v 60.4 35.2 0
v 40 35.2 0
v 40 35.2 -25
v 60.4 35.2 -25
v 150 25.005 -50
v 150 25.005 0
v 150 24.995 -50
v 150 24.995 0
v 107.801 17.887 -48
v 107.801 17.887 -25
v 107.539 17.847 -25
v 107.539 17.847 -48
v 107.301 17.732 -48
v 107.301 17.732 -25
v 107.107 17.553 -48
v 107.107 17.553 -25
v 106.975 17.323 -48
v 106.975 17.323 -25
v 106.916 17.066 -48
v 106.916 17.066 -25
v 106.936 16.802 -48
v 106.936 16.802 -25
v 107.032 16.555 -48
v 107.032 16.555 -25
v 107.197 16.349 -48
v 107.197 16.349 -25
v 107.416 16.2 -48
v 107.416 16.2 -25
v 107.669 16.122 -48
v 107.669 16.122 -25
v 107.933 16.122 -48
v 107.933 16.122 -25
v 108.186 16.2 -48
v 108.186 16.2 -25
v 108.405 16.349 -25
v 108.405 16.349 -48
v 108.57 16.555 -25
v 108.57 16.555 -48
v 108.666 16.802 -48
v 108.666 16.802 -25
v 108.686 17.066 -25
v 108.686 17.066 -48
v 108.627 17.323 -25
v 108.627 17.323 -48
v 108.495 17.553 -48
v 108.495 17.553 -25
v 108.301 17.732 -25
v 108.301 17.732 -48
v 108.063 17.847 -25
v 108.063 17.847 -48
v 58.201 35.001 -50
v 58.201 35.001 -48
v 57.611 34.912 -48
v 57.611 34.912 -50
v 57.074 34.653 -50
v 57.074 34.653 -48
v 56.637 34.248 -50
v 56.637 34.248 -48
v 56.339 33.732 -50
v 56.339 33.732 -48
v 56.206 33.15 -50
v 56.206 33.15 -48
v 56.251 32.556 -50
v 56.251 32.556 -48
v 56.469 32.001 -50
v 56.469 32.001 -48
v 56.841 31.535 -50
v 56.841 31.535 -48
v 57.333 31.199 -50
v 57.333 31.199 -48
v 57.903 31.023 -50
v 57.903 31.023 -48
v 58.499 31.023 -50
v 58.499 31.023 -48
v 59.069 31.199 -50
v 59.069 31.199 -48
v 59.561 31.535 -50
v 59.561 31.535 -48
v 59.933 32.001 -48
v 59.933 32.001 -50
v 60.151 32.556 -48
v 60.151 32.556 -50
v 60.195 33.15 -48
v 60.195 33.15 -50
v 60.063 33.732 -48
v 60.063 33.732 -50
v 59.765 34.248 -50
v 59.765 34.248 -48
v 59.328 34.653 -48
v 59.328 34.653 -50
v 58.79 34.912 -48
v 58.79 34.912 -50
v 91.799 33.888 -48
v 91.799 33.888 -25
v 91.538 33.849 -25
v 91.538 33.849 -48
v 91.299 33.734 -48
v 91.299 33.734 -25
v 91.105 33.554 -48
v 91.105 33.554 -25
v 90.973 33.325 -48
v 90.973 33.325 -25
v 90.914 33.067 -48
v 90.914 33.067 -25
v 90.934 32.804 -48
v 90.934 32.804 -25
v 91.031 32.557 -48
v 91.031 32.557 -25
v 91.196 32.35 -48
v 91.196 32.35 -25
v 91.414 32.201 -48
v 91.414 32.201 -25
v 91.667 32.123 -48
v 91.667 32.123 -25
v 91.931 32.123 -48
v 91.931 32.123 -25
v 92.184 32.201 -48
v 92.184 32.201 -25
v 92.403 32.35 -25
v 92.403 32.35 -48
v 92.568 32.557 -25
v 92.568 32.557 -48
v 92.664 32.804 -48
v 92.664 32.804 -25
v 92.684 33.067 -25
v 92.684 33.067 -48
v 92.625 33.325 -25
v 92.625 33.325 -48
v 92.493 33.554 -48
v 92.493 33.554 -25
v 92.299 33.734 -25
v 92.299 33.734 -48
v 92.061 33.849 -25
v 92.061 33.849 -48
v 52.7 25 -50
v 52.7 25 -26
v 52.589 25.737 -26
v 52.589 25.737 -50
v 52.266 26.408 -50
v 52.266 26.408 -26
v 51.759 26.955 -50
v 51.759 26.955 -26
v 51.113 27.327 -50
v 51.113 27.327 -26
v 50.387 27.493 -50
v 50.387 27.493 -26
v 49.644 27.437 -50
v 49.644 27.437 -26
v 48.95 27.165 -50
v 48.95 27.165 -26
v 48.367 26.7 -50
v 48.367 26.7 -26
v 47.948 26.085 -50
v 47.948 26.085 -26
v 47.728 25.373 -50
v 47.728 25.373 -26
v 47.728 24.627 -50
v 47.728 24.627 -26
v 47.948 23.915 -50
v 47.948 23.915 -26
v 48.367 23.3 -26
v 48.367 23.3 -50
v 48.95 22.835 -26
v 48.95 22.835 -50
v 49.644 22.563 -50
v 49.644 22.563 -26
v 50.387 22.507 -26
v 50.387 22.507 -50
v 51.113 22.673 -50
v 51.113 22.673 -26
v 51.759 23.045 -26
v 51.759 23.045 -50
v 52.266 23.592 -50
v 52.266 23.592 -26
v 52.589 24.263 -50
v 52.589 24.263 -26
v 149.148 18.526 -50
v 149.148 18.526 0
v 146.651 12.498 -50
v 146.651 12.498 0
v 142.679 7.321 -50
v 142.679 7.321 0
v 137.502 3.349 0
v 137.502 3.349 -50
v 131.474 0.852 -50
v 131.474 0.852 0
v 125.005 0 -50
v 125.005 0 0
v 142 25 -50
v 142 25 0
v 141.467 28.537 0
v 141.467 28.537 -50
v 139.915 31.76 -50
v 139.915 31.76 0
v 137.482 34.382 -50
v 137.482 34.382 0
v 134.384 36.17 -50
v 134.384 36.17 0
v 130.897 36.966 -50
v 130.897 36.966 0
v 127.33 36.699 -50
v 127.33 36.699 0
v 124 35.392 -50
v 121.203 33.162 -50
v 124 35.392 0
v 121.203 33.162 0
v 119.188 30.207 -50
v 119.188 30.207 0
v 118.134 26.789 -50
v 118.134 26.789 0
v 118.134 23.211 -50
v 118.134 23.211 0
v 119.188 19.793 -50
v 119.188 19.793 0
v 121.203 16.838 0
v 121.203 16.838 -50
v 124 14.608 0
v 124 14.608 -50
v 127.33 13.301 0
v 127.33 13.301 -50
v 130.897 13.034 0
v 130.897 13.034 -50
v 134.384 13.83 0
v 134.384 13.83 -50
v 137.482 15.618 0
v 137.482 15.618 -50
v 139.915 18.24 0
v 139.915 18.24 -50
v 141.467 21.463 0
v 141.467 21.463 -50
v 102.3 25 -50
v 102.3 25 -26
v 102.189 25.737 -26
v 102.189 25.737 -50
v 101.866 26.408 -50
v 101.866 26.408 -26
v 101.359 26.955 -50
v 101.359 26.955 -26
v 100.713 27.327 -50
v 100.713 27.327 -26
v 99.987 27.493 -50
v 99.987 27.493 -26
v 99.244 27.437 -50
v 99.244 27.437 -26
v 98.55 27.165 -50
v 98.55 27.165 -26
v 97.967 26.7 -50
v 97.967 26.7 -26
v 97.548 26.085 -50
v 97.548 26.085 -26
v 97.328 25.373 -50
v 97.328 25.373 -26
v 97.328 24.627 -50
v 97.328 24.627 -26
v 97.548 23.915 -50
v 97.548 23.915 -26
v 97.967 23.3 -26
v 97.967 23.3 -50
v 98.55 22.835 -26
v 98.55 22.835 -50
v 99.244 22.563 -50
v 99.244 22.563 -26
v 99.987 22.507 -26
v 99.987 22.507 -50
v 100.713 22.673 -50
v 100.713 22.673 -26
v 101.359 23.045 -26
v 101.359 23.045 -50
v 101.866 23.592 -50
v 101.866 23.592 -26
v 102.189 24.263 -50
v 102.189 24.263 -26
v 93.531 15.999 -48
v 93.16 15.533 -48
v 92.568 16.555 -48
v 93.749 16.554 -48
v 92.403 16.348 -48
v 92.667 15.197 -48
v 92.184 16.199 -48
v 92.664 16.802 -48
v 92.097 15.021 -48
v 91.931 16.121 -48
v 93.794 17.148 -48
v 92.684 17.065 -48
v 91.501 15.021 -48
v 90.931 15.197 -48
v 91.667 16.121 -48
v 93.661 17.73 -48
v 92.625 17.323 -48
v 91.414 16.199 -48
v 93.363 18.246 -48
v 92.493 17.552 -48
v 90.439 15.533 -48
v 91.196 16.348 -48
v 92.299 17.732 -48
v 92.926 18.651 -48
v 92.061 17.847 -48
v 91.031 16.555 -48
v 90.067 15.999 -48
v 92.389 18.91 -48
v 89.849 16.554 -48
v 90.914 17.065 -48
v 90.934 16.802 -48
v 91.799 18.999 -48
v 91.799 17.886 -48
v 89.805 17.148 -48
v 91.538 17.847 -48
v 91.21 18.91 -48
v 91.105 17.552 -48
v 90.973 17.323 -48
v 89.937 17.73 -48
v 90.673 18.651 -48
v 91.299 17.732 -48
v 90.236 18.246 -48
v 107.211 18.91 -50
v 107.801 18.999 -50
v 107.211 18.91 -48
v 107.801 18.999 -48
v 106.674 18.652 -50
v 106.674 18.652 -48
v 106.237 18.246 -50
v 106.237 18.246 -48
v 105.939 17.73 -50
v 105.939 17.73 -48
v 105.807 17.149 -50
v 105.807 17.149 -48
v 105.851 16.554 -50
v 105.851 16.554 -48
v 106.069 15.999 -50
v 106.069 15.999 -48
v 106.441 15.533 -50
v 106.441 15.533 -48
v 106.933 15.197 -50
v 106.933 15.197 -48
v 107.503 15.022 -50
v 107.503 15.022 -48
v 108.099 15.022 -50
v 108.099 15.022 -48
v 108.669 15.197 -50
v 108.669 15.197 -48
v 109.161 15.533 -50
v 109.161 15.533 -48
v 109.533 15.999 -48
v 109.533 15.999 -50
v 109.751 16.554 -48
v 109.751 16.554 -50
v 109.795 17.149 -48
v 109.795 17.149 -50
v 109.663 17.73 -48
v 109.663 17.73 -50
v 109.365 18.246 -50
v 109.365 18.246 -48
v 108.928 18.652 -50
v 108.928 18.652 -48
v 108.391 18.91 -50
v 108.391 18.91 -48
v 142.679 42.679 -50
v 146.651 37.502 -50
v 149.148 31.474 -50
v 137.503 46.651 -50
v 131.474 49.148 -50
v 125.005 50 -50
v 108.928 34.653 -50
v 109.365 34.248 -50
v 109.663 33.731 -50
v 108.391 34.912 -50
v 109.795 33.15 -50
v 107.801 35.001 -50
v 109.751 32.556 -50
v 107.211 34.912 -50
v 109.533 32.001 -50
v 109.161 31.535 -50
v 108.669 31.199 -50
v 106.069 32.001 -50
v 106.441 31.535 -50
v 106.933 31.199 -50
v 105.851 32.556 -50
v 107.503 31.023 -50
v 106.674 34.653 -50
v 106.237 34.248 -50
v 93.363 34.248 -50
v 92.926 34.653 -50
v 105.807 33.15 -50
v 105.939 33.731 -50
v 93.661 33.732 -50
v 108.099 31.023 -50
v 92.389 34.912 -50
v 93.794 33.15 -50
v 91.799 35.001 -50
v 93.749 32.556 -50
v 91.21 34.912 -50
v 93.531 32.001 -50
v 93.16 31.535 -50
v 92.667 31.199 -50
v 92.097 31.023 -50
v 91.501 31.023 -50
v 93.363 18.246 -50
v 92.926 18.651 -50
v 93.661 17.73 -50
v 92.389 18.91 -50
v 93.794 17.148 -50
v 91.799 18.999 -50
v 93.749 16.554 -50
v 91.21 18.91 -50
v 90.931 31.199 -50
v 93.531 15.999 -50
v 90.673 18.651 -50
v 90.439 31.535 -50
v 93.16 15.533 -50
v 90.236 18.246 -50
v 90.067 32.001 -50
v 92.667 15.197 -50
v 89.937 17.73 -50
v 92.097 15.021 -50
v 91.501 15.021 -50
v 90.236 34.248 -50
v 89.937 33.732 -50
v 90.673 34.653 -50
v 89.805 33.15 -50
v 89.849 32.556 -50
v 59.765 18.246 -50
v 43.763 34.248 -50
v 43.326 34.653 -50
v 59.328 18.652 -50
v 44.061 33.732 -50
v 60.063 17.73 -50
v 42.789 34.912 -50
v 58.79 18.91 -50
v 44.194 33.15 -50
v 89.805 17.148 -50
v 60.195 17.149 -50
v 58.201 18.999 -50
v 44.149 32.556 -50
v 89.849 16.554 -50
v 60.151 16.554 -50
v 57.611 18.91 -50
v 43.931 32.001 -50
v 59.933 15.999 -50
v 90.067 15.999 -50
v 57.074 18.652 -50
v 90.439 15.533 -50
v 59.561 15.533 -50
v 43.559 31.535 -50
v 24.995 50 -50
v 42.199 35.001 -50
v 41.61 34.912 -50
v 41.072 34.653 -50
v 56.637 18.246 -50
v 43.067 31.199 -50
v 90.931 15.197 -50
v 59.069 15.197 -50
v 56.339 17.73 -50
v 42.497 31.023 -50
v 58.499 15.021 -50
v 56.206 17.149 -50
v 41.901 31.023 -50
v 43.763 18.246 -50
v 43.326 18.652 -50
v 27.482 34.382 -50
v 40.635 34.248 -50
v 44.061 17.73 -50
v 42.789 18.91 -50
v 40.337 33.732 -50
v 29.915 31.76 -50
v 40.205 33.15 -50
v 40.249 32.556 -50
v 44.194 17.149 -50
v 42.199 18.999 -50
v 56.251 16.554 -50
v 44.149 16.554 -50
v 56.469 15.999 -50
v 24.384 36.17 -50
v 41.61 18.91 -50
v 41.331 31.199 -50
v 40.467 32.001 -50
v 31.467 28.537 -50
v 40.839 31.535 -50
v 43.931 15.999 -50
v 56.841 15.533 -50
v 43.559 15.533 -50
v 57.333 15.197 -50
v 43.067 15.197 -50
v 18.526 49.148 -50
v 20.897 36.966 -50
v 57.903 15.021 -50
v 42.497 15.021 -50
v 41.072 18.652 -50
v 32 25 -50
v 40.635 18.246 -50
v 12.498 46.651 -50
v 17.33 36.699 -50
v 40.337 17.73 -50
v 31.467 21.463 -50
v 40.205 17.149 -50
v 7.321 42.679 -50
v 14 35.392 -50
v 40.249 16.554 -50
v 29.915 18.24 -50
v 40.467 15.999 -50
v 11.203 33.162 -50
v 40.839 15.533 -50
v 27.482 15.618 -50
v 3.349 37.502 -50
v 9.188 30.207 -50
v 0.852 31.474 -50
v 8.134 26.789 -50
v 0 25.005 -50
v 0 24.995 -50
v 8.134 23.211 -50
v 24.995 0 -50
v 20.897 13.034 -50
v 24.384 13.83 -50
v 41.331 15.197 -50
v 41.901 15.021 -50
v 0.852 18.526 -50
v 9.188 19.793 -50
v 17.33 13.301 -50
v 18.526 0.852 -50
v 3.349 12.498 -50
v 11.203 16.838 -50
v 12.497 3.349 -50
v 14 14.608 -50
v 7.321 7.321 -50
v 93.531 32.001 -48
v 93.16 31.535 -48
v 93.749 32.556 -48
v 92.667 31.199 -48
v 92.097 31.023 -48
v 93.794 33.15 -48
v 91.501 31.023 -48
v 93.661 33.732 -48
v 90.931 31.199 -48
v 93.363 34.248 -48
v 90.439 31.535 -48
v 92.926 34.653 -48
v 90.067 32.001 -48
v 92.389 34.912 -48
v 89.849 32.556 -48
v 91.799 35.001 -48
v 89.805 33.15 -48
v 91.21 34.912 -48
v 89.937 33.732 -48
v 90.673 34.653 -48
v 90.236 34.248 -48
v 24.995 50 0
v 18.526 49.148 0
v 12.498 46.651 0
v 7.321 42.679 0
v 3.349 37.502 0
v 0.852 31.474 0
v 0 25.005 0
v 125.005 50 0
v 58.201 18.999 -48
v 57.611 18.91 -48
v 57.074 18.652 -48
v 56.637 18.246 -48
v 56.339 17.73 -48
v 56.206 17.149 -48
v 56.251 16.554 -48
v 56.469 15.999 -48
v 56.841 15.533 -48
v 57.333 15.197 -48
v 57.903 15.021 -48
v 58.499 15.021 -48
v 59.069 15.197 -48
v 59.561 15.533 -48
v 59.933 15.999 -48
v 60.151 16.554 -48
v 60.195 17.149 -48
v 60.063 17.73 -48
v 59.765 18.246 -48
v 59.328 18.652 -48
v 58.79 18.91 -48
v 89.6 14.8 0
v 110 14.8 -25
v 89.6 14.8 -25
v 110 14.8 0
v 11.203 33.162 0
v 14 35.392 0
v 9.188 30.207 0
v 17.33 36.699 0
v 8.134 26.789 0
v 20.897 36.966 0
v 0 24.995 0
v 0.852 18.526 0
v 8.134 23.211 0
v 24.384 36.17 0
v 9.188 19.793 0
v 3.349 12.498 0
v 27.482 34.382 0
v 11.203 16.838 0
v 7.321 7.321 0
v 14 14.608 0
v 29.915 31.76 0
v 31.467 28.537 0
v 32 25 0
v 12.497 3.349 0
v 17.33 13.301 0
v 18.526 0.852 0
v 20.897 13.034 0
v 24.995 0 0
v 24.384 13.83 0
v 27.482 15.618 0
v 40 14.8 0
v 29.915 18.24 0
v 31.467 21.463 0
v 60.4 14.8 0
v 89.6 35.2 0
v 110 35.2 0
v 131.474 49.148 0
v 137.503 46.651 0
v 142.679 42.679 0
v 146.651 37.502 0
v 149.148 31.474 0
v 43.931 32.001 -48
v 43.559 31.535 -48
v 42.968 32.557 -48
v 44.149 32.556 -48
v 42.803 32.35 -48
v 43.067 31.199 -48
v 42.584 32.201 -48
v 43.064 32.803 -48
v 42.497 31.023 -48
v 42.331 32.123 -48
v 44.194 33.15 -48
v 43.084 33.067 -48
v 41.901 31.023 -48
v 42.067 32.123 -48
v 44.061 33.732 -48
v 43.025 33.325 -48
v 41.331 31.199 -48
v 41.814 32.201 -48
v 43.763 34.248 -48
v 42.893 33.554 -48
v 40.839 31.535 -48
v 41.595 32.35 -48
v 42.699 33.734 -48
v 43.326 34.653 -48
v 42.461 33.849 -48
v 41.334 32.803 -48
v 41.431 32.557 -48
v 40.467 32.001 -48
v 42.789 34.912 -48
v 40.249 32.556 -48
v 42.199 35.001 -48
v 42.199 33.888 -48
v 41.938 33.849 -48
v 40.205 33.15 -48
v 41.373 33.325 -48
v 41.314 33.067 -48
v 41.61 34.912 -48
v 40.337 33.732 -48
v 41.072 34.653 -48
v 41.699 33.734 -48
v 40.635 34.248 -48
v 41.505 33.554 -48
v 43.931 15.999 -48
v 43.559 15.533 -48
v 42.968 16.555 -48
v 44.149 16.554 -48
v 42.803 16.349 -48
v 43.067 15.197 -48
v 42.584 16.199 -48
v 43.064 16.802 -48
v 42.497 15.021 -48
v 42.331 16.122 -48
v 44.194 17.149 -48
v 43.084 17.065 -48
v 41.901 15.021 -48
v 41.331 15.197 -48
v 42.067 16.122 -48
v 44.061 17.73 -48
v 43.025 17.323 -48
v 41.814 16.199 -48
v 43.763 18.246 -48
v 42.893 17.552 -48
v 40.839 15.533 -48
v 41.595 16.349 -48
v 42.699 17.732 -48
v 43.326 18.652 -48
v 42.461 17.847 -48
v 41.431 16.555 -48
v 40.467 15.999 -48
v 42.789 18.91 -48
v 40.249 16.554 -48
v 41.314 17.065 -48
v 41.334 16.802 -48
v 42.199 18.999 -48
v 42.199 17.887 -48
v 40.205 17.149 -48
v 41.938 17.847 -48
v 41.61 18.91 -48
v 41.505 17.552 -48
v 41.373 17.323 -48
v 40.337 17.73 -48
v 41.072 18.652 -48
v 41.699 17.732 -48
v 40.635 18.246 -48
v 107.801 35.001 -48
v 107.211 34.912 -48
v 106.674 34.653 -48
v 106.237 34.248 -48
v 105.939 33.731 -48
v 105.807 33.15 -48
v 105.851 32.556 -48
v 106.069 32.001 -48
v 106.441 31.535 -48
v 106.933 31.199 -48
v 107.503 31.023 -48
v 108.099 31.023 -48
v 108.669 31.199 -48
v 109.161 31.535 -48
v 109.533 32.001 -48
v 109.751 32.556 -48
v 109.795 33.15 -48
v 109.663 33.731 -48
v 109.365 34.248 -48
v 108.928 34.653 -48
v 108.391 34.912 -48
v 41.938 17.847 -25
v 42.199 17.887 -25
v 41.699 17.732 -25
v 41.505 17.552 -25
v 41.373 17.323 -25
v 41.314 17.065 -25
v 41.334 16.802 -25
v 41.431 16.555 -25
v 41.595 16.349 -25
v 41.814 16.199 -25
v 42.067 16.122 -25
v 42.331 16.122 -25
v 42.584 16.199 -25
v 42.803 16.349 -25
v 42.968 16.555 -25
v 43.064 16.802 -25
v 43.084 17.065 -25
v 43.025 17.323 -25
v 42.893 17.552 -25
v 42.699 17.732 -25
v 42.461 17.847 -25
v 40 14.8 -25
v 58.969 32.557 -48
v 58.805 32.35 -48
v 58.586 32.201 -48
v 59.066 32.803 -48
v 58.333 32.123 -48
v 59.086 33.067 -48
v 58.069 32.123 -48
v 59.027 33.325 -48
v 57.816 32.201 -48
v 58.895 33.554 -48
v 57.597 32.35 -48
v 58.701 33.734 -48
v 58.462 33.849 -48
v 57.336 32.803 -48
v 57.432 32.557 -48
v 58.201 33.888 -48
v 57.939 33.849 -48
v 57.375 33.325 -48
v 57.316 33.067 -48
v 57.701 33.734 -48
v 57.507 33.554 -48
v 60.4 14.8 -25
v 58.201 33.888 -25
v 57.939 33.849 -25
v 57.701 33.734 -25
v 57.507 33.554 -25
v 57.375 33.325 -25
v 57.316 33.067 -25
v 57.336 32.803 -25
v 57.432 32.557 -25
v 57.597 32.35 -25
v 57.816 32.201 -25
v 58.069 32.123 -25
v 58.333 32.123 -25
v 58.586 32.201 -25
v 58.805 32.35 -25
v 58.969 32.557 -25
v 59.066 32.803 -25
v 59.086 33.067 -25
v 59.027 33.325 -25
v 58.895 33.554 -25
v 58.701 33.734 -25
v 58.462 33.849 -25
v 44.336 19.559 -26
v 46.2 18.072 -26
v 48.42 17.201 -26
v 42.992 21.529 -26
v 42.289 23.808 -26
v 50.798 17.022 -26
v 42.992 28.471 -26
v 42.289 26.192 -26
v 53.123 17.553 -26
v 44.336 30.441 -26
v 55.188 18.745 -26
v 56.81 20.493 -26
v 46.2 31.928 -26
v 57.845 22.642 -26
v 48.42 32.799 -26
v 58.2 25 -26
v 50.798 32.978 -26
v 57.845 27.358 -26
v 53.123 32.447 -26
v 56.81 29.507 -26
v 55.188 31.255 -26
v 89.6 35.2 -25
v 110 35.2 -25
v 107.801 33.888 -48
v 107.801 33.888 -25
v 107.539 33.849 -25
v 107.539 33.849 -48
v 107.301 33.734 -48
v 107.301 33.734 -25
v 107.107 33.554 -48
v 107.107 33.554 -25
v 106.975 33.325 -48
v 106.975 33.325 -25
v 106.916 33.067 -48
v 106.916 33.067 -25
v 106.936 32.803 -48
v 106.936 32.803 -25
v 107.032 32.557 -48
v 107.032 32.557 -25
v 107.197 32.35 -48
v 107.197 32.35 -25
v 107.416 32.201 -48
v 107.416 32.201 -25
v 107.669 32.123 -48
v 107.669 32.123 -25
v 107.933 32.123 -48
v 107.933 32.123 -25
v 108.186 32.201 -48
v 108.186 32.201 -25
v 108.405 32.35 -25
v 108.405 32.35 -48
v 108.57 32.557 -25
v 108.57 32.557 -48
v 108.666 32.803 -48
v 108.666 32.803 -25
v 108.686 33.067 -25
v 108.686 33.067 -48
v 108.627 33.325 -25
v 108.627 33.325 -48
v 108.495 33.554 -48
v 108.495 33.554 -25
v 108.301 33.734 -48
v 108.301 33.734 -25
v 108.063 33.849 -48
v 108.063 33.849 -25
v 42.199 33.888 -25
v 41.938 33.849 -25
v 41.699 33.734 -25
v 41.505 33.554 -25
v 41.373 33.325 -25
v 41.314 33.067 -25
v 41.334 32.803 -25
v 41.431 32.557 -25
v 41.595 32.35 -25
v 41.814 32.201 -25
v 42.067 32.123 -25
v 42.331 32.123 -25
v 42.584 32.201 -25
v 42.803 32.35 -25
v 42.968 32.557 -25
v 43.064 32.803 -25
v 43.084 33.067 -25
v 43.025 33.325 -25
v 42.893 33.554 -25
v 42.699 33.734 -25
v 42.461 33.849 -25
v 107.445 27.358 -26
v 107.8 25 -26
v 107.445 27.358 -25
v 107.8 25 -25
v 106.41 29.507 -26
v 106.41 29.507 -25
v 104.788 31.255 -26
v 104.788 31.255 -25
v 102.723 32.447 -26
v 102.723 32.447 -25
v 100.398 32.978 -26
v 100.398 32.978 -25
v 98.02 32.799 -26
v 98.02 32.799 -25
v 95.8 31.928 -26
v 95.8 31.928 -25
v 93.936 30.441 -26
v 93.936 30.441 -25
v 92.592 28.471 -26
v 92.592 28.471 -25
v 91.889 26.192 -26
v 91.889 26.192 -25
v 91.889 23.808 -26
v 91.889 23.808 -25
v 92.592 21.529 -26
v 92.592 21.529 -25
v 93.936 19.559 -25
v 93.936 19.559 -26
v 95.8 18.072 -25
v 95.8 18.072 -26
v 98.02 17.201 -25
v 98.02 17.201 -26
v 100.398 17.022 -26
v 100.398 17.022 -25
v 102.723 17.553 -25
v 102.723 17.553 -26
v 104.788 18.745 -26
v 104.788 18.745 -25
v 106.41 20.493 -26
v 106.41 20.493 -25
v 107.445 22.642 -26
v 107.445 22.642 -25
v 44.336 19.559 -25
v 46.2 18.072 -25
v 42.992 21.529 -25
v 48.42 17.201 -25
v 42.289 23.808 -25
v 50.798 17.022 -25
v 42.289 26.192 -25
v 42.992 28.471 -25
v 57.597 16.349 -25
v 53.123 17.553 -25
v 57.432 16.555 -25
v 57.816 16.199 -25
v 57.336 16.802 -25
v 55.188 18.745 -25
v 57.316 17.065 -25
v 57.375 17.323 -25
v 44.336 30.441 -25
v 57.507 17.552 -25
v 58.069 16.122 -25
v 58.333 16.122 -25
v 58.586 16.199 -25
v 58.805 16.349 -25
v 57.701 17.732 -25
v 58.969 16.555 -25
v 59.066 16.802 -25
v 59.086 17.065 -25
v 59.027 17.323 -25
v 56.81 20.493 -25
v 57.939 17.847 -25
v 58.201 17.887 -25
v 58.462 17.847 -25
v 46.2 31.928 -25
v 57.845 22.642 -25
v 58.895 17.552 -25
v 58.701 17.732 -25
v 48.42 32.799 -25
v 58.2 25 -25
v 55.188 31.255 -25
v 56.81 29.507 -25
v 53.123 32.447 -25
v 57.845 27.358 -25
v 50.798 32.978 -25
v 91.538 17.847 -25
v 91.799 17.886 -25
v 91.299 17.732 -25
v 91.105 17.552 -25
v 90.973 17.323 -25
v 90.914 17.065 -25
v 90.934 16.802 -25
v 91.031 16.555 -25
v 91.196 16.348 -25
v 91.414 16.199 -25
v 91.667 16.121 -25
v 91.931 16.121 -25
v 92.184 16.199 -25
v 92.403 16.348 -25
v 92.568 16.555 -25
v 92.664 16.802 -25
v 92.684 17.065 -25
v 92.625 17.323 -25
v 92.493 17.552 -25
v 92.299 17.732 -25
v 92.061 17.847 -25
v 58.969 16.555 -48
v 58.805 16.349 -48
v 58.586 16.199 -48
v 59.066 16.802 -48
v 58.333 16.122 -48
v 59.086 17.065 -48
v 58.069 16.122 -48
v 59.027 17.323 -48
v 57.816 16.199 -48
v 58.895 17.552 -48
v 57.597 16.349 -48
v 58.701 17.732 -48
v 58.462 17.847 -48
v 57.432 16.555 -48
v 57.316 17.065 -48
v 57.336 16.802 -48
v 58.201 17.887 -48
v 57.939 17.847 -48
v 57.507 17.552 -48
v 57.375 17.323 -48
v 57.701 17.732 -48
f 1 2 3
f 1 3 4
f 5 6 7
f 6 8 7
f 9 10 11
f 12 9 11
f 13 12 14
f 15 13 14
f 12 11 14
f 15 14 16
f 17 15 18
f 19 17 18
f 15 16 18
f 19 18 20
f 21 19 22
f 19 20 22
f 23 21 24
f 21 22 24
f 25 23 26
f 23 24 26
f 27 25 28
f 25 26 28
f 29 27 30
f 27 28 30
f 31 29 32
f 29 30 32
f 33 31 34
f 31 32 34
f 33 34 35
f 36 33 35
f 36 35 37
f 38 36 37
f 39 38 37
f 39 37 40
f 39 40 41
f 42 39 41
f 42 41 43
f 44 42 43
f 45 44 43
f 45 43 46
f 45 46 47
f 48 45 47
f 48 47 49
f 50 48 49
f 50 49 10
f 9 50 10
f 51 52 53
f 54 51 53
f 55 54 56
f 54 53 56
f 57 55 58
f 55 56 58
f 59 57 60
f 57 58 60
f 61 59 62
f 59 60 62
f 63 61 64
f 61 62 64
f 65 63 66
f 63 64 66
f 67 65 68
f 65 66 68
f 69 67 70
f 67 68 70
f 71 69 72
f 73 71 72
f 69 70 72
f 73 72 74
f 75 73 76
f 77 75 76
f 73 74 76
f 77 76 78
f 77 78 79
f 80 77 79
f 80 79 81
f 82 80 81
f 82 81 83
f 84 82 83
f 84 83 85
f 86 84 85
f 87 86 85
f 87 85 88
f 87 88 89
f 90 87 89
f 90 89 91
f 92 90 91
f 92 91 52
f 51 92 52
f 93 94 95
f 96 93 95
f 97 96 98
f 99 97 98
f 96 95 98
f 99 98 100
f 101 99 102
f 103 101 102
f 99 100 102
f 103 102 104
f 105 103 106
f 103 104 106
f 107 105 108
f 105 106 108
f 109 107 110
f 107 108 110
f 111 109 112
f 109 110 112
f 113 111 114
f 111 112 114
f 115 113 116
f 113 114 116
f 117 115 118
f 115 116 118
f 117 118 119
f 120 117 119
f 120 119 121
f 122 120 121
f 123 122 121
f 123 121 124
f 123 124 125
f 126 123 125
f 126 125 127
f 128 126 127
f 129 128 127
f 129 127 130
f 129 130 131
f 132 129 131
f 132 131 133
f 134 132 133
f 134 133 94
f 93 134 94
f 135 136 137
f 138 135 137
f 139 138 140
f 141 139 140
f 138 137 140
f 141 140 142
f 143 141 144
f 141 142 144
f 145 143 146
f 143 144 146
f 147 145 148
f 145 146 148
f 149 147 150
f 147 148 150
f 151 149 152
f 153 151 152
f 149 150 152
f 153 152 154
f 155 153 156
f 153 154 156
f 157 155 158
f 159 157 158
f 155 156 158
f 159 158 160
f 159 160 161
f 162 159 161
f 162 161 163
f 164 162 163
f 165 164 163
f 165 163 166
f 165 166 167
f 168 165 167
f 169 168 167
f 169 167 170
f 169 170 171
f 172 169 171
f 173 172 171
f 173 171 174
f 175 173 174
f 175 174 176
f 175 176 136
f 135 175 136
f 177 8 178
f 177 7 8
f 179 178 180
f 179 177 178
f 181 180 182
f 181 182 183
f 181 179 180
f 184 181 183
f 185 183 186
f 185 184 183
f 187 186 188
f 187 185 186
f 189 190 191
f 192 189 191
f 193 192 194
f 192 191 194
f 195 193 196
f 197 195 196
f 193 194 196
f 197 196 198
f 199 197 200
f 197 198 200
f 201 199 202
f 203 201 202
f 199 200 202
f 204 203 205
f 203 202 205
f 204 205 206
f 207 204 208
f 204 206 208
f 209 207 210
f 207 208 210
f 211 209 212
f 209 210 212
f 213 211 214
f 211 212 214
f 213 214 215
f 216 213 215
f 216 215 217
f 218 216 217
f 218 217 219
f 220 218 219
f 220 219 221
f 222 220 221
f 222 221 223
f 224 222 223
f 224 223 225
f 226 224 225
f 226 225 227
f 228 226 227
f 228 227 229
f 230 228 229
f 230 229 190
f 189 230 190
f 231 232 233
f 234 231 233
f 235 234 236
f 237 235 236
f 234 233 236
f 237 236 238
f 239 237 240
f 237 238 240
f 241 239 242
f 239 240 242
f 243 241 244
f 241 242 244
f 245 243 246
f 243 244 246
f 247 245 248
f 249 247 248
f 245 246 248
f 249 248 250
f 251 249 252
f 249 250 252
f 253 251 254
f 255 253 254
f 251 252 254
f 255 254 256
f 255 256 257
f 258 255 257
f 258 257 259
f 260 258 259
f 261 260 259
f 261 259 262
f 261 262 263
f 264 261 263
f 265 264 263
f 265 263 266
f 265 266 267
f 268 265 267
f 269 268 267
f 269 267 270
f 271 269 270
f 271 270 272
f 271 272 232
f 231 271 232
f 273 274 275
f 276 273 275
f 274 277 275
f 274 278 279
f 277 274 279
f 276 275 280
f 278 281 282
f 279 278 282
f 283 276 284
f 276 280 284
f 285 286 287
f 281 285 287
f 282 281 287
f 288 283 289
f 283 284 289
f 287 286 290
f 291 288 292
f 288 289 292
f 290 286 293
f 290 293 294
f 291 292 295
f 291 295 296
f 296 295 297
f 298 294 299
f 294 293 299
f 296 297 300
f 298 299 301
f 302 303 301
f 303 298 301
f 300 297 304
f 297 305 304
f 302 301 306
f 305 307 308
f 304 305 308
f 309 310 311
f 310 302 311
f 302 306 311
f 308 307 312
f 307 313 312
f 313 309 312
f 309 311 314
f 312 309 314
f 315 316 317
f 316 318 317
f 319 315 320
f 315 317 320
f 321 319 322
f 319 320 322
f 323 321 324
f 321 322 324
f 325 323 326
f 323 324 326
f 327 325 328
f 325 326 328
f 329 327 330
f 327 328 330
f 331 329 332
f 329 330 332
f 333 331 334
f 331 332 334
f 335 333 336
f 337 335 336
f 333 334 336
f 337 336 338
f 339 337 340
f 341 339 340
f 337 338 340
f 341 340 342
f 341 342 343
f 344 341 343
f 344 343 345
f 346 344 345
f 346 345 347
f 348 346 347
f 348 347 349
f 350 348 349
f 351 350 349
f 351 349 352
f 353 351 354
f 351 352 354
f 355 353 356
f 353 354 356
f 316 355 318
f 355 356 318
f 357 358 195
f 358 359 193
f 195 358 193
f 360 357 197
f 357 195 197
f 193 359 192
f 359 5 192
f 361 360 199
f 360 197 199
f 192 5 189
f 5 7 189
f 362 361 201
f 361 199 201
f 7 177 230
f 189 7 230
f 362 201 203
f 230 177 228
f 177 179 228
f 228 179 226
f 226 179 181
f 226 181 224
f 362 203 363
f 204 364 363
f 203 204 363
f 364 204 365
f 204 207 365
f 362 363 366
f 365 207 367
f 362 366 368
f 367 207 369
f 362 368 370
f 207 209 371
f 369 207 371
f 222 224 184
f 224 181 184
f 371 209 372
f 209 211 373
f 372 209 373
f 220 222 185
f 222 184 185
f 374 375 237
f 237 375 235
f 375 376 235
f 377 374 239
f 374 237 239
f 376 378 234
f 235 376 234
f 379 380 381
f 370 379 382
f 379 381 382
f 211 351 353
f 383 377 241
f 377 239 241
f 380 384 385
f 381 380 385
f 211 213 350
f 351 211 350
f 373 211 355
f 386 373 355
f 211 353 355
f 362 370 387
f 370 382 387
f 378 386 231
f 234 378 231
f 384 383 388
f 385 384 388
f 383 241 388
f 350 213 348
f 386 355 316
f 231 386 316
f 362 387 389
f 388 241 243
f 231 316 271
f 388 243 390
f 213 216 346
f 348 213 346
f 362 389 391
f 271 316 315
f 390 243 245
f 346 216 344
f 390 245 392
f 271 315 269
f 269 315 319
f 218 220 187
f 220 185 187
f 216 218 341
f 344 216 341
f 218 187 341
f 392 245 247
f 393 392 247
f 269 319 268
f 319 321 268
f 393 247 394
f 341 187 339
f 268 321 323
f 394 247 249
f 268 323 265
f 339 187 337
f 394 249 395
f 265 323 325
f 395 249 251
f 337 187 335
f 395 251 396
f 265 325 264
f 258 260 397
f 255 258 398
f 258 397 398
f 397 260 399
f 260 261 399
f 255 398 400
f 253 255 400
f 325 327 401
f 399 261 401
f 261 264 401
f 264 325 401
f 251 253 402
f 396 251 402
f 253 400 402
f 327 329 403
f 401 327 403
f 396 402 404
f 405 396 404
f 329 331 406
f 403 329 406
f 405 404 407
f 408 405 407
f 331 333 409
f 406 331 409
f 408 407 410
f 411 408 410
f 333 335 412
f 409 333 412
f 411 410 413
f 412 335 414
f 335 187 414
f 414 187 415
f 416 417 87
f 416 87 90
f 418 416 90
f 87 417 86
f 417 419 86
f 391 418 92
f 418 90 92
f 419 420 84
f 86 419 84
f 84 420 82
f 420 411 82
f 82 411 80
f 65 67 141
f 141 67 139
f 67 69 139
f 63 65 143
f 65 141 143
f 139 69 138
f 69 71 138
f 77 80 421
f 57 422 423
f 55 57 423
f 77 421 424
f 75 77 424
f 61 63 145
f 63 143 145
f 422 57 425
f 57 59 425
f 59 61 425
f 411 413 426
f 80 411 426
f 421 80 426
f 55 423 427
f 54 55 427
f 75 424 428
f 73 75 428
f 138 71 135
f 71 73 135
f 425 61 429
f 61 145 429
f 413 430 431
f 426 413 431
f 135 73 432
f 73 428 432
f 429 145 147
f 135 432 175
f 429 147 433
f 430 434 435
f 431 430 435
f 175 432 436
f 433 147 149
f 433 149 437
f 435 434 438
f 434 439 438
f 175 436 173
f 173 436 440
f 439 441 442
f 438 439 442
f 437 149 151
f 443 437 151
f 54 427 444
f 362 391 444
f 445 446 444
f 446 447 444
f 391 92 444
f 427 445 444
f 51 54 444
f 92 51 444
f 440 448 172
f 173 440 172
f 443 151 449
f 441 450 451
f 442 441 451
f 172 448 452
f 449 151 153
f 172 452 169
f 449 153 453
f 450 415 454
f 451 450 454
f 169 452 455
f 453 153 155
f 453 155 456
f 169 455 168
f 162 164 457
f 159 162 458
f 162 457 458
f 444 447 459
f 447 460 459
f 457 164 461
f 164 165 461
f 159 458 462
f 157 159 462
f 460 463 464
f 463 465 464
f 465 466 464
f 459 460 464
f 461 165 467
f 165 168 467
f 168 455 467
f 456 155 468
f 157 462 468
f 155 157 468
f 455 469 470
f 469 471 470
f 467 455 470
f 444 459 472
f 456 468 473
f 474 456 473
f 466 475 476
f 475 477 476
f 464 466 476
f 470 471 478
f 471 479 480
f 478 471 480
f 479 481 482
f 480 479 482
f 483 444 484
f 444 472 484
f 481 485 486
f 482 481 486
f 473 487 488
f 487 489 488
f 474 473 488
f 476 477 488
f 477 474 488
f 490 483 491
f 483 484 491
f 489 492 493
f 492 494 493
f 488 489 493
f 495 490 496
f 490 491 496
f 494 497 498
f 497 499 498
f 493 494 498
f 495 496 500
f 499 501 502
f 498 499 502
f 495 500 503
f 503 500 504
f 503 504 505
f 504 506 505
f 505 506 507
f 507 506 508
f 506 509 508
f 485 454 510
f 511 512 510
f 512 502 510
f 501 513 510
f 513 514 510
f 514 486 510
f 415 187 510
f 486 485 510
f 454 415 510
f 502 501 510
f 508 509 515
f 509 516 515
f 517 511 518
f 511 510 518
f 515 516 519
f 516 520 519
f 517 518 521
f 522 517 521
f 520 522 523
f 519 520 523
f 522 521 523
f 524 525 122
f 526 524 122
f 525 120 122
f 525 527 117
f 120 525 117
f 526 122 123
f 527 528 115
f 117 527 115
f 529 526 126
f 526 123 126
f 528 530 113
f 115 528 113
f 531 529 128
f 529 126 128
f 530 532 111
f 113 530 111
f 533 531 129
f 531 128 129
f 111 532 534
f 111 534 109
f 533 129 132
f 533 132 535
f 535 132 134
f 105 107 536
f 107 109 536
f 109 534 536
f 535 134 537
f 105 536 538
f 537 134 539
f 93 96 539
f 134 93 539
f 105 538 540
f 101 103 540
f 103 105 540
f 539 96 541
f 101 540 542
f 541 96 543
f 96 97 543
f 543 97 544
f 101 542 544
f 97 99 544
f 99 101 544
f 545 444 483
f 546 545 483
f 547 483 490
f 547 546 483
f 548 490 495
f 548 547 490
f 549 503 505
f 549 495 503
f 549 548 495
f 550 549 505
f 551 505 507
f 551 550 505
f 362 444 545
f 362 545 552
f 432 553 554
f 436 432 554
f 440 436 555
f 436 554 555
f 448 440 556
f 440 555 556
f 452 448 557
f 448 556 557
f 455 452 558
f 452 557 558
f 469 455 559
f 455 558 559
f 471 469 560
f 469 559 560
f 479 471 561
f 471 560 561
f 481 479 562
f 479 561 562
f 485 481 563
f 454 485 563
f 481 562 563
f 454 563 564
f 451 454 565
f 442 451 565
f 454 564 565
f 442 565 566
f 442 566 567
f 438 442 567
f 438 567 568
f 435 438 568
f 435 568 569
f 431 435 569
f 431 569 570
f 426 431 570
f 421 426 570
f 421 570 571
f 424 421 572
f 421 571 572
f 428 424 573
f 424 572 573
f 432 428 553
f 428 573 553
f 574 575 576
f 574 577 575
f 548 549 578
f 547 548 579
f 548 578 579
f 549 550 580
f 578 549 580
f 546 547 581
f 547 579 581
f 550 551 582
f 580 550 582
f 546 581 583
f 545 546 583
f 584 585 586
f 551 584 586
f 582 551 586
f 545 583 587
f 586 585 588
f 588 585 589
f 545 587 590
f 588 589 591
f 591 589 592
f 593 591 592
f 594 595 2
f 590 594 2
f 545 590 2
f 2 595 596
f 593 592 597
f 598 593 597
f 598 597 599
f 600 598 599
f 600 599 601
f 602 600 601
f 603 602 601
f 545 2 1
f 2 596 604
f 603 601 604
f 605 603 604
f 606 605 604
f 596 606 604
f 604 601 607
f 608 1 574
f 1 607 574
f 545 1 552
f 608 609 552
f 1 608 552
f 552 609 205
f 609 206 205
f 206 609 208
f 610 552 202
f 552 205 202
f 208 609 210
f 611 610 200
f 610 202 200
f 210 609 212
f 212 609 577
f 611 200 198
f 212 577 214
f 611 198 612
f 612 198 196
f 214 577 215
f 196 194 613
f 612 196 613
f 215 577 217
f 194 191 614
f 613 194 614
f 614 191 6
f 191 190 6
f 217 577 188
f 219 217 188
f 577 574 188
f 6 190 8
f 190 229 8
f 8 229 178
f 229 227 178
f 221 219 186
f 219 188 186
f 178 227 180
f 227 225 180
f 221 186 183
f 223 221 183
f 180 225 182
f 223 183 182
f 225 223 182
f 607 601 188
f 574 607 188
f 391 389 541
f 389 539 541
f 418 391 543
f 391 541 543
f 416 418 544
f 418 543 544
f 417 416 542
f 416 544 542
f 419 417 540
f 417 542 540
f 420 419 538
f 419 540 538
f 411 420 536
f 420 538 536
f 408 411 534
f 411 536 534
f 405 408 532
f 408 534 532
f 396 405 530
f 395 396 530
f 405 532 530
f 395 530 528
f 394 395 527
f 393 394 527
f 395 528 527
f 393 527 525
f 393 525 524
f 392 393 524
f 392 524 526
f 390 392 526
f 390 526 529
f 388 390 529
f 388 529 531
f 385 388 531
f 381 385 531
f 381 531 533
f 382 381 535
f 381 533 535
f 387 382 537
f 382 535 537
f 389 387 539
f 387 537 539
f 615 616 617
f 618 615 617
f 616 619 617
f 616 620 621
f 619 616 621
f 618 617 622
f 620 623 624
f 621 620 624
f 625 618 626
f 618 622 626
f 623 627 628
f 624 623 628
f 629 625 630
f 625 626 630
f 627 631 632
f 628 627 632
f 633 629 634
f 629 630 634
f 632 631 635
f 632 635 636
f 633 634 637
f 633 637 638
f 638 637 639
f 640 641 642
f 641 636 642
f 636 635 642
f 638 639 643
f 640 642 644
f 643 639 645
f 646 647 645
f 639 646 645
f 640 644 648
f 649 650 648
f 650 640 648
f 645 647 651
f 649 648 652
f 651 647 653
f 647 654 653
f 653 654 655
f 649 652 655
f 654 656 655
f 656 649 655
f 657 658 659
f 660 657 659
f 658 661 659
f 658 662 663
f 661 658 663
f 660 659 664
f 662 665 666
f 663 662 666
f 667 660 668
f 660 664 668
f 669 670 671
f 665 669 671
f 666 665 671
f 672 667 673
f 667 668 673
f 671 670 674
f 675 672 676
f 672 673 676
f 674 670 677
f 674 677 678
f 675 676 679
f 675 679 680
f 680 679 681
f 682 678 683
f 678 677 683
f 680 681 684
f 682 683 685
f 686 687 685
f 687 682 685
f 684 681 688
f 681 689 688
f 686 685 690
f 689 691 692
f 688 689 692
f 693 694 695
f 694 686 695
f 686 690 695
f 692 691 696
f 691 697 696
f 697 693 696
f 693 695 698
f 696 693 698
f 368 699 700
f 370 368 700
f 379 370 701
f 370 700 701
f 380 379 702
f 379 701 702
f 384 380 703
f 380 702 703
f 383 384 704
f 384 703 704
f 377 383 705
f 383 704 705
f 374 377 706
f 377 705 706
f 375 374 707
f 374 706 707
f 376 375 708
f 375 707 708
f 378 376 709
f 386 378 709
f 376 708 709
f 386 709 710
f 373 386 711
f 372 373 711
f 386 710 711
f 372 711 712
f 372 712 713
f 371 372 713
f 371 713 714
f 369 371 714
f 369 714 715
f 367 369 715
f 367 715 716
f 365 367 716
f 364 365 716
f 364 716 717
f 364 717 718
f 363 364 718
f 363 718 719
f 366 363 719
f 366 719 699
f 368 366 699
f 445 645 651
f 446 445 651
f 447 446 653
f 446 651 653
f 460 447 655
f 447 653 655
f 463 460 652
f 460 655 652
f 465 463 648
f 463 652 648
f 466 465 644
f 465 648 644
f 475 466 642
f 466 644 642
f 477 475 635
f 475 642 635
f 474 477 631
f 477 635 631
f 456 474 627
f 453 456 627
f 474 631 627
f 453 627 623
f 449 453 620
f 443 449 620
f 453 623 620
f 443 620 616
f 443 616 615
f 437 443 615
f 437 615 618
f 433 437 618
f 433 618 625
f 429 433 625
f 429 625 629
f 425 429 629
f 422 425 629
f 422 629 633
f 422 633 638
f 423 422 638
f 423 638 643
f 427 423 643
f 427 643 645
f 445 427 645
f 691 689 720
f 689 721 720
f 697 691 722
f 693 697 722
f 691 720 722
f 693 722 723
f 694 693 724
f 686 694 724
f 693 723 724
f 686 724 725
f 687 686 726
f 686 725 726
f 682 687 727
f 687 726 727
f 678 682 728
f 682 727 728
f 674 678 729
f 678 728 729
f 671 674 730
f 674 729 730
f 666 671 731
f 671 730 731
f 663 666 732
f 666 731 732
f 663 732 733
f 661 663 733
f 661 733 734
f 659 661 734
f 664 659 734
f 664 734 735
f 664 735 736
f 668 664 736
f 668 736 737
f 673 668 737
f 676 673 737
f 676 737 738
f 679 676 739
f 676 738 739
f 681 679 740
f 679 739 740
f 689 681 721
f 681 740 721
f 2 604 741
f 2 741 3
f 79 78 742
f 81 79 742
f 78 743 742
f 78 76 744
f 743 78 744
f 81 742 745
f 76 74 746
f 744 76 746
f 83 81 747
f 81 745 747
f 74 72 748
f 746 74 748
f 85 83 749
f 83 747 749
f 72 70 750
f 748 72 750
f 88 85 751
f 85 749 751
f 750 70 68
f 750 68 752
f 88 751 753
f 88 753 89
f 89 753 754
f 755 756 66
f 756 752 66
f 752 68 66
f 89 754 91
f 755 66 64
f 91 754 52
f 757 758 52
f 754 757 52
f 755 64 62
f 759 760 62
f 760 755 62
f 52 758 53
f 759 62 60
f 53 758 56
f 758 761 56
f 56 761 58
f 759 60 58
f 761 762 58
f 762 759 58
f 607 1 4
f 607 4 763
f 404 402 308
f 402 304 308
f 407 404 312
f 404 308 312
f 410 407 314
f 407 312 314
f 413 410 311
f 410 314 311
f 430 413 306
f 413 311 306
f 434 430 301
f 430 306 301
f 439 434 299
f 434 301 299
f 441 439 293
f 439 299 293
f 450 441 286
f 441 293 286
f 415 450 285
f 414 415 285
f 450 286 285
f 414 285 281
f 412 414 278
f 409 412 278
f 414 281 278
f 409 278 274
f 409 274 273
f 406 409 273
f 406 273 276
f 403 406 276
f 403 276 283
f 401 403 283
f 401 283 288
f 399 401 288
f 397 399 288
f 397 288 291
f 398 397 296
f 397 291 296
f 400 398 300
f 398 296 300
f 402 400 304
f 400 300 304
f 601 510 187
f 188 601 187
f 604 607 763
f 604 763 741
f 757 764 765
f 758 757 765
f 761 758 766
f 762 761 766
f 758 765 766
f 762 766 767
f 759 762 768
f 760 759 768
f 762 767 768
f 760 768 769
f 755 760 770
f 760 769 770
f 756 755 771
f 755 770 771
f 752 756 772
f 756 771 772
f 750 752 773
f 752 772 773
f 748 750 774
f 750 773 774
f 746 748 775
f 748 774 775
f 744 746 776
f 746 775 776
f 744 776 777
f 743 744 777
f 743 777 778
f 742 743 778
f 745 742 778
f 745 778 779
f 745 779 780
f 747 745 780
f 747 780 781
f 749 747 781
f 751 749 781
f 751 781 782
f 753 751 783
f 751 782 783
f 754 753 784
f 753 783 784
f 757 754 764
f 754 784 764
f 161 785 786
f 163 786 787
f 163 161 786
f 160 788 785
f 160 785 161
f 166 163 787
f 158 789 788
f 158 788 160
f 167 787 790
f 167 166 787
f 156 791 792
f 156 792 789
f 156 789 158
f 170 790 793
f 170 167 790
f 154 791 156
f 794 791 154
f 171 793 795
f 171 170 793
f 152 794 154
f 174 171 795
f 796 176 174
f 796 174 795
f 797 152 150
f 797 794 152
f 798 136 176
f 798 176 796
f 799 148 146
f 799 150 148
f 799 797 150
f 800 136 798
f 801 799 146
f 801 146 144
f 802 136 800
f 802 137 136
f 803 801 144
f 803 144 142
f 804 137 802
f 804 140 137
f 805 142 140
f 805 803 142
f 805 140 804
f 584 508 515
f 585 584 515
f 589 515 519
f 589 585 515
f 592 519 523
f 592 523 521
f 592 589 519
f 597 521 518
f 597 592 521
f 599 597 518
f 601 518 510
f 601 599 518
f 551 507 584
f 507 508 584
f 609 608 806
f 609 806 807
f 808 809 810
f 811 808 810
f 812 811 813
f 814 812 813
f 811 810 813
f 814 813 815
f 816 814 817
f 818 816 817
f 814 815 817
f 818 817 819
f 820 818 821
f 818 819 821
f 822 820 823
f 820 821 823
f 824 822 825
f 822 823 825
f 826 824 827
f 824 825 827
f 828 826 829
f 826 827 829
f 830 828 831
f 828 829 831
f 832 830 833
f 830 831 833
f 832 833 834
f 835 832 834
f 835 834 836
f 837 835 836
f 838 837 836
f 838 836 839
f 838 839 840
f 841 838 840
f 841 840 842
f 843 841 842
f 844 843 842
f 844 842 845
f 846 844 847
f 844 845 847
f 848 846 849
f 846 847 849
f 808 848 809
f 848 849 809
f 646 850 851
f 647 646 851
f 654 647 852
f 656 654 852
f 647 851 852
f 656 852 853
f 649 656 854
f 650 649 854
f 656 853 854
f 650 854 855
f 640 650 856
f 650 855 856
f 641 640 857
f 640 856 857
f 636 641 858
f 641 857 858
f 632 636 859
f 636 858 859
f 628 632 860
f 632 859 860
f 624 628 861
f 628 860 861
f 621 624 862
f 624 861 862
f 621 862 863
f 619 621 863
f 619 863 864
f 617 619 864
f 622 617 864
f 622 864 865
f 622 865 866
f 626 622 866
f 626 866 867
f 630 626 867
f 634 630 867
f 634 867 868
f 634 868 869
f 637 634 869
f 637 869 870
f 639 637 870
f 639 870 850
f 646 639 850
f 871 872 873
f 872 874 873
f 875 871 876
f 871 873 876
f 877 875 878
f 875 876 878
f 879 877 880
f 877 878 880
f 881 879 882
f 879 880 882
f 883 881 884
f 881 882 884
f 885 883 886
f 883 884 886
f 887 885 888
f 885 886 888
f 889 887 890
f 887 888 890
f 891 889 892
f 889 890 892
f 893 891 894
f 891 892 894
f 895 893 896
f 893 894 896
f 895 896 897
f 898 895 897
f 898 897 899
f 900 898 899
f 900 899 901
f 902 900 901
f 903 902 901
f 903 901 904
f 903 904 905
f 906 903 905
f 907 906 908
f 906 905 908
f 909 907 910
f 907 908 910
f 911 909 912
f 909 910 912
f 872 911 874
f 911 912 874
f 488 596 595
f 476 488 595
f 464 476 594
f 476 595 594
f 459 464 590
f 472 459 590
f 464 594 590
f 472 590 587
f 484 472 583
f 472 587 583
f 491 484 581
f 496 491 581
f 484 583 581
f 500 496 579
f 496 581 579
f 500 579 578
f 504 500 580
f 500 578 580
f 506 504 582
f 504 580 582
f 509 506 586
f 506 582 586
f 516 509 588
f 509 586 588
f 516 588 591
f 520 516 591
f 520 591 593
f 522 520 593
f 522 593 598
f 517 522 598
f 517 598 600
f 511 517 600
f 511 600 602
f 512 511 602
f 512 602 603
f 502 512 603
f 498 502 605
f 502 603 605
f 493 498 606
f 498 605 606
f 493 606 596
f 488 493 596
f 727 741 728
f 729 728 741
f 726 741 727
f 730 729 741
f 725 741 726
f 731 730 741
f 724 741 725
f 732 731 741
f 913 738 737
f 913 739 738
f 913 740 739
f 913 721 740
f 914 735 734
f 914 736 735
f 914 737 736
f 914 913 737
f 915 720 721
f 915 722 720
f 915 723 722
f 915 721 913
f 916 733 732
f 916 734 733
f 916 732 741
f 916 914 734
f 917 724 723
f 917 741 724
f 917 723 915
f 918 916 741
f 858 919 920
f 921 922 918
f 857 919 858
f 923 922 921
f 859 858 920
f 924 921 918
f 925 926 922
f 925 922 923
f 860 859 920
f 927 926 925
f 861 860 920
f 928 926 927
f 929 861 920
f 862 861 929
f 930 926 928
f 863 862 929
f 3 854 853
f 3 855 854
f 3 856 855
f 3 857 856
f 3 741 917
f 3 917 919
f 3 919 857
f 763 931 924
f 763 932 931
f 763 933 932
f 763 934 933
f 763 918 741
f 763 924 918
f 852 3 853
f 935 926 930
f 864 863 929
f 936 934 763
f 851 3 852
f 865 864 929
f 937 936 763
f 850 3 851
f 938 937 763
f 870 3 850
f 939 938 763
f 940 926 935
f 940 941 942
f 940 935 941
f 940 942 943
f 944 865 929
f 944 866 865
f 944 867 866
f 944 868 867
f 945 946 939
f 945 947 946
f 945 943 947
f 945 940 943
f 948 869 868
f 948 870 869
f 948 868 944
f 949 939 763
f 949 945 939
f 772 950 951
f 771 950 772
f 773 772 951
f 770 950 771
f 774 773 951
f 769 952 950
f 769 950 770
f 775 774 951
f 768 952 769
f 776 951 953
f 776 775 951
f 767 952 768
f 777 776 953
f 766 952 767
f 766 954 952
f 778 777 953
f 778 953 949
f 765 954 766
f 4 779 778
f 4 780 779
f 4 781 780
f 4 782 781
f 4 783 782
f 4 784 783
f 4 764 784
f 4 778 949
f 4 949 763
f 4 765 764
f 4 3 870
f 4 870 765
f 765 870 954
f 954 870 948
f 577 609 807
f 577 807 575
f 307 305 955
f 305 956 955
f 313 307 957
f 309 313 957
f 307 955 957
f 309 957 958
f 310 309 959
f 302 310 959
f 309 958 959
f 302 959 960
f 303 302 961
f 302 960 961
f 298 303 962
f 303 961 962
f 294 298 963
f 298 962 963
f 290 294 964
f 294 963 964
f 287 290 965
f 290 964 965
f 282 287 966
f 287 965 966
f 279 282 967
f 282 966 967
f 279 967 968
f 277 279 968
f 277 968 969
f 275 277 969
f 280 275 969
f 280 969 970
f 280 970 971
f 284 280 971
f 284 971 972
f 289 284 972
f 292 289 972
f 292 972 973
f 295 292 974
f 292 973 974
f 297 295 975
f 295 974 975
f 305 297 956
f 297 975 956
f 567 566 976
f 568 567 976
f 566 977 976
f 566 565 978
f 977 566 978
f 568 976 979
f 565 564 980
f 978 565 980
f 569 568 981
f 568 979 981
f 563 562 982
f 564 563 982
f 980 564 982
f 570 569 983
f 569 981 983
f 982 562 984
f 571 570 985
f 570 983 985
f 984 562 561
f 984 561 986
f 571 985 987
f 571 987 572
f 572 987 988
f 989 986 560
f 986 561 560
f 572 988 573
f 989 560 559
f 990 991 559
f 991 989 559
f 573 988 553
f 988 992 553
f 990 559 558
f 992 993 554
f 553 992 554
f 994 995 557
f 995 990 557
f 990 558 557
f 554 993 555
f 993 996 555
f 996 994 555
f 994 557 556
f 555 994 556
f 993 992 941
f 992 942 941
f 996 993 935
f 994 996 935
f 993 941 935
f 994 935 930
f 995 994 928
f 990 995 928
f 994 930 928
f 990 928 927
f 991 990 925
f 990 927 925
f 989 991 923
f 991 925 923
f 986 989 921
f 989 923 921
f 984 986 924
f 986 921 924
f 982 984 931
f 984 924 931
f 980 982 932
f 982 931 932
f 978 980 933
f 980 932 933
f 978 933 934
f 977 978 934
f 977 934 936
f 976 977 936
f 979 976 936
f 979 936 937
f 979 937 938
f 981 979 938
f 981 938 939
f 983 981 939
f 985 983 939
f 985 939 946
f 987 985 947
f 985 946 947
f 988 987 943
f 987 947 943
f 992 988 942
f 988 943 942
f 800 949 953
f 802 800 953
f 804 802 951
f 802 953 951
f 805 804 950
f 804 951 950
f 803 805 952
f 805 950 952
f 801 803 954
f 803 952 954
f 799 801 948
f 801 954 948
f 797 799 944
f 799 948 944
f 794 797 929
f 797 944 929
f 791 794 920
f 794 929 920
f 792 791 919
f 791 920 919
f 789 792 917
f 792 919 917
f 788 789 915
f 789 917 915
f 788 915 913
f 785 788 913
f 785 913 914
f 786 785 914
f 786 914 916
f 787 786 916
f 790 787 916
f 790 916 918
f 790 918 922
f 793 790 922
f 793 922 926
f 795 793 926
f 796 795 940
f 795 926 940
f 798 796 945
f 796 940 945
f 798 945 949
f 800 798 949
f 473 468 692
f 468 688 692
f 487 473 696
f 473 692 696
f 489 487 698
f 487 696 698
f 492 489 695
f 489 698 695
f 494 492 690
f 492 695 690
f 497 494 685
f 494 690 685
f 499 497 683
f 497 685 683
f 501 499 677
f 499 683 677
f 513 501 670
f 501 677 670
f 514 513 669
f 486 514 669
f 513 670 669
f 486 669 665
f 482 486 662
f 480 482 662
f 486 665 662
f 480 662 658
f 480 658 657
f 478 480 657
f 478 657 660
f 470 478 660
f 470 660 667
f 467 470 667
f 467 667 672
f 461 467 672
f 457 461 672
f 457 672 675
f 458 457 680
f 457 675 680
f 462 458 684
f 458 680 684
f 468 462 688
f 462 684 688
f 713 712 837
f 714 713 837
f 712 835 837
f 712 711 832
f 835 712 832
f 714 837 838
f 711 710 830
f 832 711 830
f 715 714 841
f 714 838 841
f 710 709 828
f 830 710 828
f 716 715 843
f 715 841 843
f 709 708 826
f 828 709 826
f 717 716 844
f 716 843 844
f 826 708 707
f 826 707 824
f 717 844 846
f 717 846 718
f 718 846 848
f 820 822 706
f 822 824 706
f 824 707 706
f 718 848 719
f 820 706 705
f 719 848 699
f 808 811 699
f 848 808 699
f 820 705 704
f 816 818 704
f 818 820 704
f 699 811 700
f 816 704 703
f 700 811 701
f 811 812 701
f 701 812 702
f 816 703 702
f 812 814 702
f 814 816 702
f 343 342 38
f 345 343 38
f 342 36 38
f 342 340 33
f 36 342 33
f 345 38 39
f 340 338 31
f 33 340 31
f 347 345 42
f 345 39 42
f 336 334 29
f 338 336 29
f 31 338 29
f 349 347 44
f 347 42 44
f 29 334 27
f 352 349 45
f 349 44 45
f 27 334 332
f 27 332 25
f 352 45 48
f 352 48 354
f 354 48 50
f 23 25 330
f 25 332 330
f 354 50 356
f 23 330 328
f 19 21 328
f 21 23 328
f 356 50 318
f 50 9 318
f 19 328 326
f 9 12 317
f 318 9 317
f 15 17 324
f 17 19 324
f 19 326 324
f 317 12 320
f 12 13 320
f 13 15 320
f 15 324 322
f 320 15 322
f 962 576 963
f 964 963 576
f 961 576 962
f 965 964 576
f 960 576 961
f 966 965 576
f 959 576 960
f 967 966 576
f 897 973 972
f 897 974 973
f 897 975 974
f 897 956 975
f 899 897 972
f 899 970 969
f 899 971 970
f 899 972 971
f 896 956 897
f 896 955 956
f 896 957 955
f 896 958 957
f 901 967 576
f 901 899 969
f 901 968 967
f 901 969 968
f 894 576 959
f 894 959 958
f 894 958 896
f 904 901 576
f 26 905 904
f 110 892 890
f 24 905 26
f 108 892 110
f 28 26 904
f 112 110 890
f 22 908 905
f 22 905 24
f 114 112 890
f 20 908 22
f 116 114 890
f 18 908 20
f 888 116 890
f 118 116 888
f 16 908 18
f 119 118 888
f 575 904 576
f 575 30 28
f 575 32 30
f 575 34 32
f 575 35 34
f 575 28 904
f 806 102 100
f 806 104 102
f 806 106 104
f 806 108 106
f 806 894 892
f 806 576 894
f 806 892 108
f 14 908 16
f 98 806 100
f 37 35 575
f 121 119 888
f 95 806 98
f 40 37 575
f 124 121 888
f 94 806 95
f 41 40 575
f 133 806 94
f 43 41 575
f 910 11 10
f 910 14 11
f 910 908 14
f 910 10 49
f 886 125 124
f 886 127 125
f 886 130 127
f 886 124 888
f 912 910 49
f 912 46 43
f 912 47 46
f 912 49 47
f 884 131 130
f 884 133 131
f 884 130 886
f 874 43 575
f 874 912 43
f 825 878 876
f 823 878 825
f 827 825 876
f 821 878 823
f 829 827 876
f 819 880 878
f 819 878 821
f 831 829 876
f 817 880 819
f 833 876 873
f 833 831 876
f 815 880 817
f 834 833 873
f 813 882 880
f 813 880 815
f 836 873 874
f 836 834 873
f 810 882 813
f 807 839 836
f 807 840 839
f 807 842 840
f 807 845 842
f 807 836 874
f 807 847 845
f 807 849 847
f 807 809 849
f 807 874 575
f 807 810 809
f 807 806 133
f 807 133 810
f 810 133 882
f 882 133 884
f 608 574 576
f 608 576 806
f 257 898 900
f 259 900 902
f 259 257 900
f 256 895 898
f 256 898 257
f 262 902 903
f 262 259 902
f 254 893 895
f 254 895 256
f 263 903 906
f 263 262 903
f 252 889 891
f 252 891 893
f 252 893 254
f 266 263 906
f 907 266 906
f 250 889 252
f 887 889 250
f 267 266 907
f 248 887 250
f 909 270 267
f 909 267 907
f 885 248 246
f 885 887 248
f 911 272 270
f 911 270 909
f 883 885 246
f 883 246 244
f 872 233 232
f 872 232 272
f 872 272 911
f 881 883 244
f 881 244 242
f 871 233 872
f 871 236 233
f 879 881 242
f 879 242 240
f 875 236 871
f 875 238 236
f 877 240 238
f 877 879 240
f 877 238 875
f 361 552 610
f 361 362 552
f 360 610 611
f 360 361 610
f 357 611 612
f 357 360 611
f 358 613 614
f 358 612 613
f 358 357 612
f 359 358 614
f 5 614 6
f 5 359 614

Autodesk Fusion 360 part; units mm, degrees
sketch "Sketch2" plane through (0, 0, 0) normal (0, 1, 0) x (1, 0, 0)
  line L0 (0, 0) -> (150, 0)
  line L1 (150, 0) -> (150, 50)
  line L2 (150, 50) -> (0, 50)
  line L3 (0, 50) -> (0, 0)
  dimension "d11" = 150
  dimension "d12" = 50
extrude "Extrude2" add sketch "Sketch2" along normal blind 50
fillet "Fillet3" radius 25 4 edges at (0, 50, -25) (0, 0, -25) (150, 50, -25) (150, 0, -25)
sketch "Sketch3" plane through (0, 0, 0) normal (0, 0, 1) x (1, 0, 0)
  arc A0 (125, 0) -> (125, 50) centre (125, 25) ccw
  line L0 (125, 50) -> (25, 50)
  arc A1 (25, 50) -> (25, 0) centre (25, 25) ccw
  line L1 (25, 0) -> (125, 0)
  circle A2 centre (20, 25) radius 12
  circle A3 centre (130, 25) radius 12
  dimension "d19" = 24
  dimension "d20" = 24
extrude "Extrude3" cut sketch "Sketch3" against normal blind 105 contours A2 | A3
sketch "Sketch4" plane through (0, 0, 0) normal (0, 0, 1) x (1, 0, 0)
  line L0 (110.0001, 14.8) -> (89.6001, 14.8)
  line L1 (89.6001, 14.8) -> (89.6001, 35.2)
  line L2 (89.6001, 35.2) -> (110.0001, 35.2)
  line L3 (110.0001, 35.2) -> (110.0001, 14.8)
  line L4 (40, 35.2) -> (60.4, 35.2)
  line L5 (60.4, 35.2) -> (60.4, 14.8)
  line L6 (60.4, 14.8) -> (40, 14.8)
  line L7 (40, 14.8) -> (40, 35.2)
extrude "Extrude4" cut sketch "Sketch4" against normal blind 25
sketch "Sketch5" plane through (0, 0, 0) normal (0, 0, 1) x (1, 0, 0)
  line L0 (60.4, 35.2) -> (60.4, 14.8)
  line L1 (60.4, 14.8) -> (40, 14.8)
  line L2 (40, 14.8) -> (40, 35.2)
  line L3 (40, 35.2) -> (60.4, 35.2)
  line L4 (89.6001, 14.8) -> (89.6001, 35.2)
  line L5 (89.6001, 35.2) -> (110.0001, 35.2)
  line L6 (110.0001, 35.2) -> (110.0001, 14.8)
  line L7 (110.0001, 14.8) -> (89.6001, 14.8)
  circle A0 centre (20, 25) radius 12
  circle A1 centre (130, 25) radius 12
  arc A2 (125, 0) -> (125, 50) centre (125, 25) ccw
  line L8 (125, 50) -> (25, 50)
  arc A3 (25, 50) -> (25, 0) centre (25, 25) ccw
  line L9 (25, 0) -> (125, 0)
  circle A4 centre (50.2, 25) radius 2.5
  circle A5 centre (99.8001, 25) radius 2.5
  dimension "d39" = 5
  dimension "d40" = 5
extrude "Extrude5" cut sketch "Sketch5" against normal blind 85 contours A4 | A5
sketch "Sketch6" plane through (0, 0, 0) normal (0, 0, 1) x (1, 0, 0)
  circle A0 centre (50.2, 25) radius 8
  circle A1 centre (99.8, 25) radius 8
  dimension "d43" = 16
  dimension "d44" = 16
extrude "Extrude6" cut sketch "Sketch6" against normal blind 26
sketch "Sketch7" plane through (0, 0, 0) normal (0, 0, 1) x (1, 0, 0)
  line L0 (60.4, 35.2) -> (60.4, 14.8)
  line L1 (60.4, 14.8) -> (40, 14.8)
  line L2 (40, 14.8) -> (40, 35.2)
  line L3 (40, 35.2) -> (60.4, 35.2)
  line L4 (89.6001, 14.8) -> (89.6001, 35.2)
  line L5 (89.6001, 35.2) -> (110.0001, 35.2)
  line L6 (110.0001, 35.2) -> (110.0001, 14.8)
  line L7 (110.0001, 14.8) -> (89.6001, 14.8)
  circle A0 centre (20, 25) radius 12
  circle A1 centre (130, 25) radius 12
  arc A2 (125, 0) -> (125, 50) centre (125, 25) ccw
  line L8 (125, 50) -> (25, 50)
  arc A3 (25, 50) -> (25, 0) centre (25, 25) ccw
  line L9 (25, 0) -> (125, 0)
  circle A4 centre (42.1991, 33.0009) radius 1.1
  circle A5 centre (58.2009, 33.0009) radius 1.1
  circle A6 centre (58.2009, 16.9991) radius 1.1
  circle A7 centre (42.1991, 16.9991) radius 1.1
  circle A8 centre (91.7992, 33.001) radius 1.1
  circle A9 centre (91.7992, 16.999) radius 1.1
  circle A10 centre (107.801, 16.9992) radius 1.1
  circle A11 centre (107.801, 33.0008) radius 1.1
  dimension "d48" = 2.2
  dimension "d49" = 2.2
  dimension "d50" = 2.2
  dimension "d51" = 2.2
  dimension "d53" = 2.2
  dimension "d54" = 2.2
  dimension "d55" = 2.2
  dimension "d56" = 2.2
sketch "Sketch8" plane through (0, 0, -50) normal (0, 0, -1) x (-1, 0, 0)
  circle A0 centre (-50.2, 25) radius 2.5
  circle A1 centre (-99.8001, 25) radius 2.5
  circle A2 centre (-20, 25) radius 12
  circle A3 centre (-130, 25) radius 12
  arc A4 (-125, 50) -> (-125, 0) centre (-125, 25) ccw
  line L0 (-125, 0) -> (-25, 0)
  arc A5 (-25, 0) -> (-25, 50) centre (-25, 25) ccw
  line L1 (-25, 50) -> (-125, 50)
  line L2 (-107.801, 16.9992) -> (-105.9894, 15.4871)
  curve L3
  curve L4
  curve L5
  curve L6
  line L7 (-91.7992, 16.999) -> (-88.5659, 15.2744)
  line L8 (-58.2009, 33.0009) -> (-55, 31)
  line L9 (-42.1991, 33.0009) -> (-38, 28)
  line L10 (-58.2009, 16.9991) -> (-57, 14)
  line L11 (-42.1991, 16.9991) -> (-41, 14)
  dimension "d60" = 6.53
hole "Hole1" at (107.801, 33.0008, -50) at (91.7992, 33.001, -50) at (91.7992, 16.999, -50) at (107.801, 16.9992, -50) at (58.2009, 16.9991, -50) at (58.2009, 33.0009, -50) at (42.1991, 33.0009, -50) at (42.1991, 16.9991, -50) direction (0, 0, 1) diameter 1.775 depth 35 tip angle 118 counterbore diameter 4 counterbore depth 2
